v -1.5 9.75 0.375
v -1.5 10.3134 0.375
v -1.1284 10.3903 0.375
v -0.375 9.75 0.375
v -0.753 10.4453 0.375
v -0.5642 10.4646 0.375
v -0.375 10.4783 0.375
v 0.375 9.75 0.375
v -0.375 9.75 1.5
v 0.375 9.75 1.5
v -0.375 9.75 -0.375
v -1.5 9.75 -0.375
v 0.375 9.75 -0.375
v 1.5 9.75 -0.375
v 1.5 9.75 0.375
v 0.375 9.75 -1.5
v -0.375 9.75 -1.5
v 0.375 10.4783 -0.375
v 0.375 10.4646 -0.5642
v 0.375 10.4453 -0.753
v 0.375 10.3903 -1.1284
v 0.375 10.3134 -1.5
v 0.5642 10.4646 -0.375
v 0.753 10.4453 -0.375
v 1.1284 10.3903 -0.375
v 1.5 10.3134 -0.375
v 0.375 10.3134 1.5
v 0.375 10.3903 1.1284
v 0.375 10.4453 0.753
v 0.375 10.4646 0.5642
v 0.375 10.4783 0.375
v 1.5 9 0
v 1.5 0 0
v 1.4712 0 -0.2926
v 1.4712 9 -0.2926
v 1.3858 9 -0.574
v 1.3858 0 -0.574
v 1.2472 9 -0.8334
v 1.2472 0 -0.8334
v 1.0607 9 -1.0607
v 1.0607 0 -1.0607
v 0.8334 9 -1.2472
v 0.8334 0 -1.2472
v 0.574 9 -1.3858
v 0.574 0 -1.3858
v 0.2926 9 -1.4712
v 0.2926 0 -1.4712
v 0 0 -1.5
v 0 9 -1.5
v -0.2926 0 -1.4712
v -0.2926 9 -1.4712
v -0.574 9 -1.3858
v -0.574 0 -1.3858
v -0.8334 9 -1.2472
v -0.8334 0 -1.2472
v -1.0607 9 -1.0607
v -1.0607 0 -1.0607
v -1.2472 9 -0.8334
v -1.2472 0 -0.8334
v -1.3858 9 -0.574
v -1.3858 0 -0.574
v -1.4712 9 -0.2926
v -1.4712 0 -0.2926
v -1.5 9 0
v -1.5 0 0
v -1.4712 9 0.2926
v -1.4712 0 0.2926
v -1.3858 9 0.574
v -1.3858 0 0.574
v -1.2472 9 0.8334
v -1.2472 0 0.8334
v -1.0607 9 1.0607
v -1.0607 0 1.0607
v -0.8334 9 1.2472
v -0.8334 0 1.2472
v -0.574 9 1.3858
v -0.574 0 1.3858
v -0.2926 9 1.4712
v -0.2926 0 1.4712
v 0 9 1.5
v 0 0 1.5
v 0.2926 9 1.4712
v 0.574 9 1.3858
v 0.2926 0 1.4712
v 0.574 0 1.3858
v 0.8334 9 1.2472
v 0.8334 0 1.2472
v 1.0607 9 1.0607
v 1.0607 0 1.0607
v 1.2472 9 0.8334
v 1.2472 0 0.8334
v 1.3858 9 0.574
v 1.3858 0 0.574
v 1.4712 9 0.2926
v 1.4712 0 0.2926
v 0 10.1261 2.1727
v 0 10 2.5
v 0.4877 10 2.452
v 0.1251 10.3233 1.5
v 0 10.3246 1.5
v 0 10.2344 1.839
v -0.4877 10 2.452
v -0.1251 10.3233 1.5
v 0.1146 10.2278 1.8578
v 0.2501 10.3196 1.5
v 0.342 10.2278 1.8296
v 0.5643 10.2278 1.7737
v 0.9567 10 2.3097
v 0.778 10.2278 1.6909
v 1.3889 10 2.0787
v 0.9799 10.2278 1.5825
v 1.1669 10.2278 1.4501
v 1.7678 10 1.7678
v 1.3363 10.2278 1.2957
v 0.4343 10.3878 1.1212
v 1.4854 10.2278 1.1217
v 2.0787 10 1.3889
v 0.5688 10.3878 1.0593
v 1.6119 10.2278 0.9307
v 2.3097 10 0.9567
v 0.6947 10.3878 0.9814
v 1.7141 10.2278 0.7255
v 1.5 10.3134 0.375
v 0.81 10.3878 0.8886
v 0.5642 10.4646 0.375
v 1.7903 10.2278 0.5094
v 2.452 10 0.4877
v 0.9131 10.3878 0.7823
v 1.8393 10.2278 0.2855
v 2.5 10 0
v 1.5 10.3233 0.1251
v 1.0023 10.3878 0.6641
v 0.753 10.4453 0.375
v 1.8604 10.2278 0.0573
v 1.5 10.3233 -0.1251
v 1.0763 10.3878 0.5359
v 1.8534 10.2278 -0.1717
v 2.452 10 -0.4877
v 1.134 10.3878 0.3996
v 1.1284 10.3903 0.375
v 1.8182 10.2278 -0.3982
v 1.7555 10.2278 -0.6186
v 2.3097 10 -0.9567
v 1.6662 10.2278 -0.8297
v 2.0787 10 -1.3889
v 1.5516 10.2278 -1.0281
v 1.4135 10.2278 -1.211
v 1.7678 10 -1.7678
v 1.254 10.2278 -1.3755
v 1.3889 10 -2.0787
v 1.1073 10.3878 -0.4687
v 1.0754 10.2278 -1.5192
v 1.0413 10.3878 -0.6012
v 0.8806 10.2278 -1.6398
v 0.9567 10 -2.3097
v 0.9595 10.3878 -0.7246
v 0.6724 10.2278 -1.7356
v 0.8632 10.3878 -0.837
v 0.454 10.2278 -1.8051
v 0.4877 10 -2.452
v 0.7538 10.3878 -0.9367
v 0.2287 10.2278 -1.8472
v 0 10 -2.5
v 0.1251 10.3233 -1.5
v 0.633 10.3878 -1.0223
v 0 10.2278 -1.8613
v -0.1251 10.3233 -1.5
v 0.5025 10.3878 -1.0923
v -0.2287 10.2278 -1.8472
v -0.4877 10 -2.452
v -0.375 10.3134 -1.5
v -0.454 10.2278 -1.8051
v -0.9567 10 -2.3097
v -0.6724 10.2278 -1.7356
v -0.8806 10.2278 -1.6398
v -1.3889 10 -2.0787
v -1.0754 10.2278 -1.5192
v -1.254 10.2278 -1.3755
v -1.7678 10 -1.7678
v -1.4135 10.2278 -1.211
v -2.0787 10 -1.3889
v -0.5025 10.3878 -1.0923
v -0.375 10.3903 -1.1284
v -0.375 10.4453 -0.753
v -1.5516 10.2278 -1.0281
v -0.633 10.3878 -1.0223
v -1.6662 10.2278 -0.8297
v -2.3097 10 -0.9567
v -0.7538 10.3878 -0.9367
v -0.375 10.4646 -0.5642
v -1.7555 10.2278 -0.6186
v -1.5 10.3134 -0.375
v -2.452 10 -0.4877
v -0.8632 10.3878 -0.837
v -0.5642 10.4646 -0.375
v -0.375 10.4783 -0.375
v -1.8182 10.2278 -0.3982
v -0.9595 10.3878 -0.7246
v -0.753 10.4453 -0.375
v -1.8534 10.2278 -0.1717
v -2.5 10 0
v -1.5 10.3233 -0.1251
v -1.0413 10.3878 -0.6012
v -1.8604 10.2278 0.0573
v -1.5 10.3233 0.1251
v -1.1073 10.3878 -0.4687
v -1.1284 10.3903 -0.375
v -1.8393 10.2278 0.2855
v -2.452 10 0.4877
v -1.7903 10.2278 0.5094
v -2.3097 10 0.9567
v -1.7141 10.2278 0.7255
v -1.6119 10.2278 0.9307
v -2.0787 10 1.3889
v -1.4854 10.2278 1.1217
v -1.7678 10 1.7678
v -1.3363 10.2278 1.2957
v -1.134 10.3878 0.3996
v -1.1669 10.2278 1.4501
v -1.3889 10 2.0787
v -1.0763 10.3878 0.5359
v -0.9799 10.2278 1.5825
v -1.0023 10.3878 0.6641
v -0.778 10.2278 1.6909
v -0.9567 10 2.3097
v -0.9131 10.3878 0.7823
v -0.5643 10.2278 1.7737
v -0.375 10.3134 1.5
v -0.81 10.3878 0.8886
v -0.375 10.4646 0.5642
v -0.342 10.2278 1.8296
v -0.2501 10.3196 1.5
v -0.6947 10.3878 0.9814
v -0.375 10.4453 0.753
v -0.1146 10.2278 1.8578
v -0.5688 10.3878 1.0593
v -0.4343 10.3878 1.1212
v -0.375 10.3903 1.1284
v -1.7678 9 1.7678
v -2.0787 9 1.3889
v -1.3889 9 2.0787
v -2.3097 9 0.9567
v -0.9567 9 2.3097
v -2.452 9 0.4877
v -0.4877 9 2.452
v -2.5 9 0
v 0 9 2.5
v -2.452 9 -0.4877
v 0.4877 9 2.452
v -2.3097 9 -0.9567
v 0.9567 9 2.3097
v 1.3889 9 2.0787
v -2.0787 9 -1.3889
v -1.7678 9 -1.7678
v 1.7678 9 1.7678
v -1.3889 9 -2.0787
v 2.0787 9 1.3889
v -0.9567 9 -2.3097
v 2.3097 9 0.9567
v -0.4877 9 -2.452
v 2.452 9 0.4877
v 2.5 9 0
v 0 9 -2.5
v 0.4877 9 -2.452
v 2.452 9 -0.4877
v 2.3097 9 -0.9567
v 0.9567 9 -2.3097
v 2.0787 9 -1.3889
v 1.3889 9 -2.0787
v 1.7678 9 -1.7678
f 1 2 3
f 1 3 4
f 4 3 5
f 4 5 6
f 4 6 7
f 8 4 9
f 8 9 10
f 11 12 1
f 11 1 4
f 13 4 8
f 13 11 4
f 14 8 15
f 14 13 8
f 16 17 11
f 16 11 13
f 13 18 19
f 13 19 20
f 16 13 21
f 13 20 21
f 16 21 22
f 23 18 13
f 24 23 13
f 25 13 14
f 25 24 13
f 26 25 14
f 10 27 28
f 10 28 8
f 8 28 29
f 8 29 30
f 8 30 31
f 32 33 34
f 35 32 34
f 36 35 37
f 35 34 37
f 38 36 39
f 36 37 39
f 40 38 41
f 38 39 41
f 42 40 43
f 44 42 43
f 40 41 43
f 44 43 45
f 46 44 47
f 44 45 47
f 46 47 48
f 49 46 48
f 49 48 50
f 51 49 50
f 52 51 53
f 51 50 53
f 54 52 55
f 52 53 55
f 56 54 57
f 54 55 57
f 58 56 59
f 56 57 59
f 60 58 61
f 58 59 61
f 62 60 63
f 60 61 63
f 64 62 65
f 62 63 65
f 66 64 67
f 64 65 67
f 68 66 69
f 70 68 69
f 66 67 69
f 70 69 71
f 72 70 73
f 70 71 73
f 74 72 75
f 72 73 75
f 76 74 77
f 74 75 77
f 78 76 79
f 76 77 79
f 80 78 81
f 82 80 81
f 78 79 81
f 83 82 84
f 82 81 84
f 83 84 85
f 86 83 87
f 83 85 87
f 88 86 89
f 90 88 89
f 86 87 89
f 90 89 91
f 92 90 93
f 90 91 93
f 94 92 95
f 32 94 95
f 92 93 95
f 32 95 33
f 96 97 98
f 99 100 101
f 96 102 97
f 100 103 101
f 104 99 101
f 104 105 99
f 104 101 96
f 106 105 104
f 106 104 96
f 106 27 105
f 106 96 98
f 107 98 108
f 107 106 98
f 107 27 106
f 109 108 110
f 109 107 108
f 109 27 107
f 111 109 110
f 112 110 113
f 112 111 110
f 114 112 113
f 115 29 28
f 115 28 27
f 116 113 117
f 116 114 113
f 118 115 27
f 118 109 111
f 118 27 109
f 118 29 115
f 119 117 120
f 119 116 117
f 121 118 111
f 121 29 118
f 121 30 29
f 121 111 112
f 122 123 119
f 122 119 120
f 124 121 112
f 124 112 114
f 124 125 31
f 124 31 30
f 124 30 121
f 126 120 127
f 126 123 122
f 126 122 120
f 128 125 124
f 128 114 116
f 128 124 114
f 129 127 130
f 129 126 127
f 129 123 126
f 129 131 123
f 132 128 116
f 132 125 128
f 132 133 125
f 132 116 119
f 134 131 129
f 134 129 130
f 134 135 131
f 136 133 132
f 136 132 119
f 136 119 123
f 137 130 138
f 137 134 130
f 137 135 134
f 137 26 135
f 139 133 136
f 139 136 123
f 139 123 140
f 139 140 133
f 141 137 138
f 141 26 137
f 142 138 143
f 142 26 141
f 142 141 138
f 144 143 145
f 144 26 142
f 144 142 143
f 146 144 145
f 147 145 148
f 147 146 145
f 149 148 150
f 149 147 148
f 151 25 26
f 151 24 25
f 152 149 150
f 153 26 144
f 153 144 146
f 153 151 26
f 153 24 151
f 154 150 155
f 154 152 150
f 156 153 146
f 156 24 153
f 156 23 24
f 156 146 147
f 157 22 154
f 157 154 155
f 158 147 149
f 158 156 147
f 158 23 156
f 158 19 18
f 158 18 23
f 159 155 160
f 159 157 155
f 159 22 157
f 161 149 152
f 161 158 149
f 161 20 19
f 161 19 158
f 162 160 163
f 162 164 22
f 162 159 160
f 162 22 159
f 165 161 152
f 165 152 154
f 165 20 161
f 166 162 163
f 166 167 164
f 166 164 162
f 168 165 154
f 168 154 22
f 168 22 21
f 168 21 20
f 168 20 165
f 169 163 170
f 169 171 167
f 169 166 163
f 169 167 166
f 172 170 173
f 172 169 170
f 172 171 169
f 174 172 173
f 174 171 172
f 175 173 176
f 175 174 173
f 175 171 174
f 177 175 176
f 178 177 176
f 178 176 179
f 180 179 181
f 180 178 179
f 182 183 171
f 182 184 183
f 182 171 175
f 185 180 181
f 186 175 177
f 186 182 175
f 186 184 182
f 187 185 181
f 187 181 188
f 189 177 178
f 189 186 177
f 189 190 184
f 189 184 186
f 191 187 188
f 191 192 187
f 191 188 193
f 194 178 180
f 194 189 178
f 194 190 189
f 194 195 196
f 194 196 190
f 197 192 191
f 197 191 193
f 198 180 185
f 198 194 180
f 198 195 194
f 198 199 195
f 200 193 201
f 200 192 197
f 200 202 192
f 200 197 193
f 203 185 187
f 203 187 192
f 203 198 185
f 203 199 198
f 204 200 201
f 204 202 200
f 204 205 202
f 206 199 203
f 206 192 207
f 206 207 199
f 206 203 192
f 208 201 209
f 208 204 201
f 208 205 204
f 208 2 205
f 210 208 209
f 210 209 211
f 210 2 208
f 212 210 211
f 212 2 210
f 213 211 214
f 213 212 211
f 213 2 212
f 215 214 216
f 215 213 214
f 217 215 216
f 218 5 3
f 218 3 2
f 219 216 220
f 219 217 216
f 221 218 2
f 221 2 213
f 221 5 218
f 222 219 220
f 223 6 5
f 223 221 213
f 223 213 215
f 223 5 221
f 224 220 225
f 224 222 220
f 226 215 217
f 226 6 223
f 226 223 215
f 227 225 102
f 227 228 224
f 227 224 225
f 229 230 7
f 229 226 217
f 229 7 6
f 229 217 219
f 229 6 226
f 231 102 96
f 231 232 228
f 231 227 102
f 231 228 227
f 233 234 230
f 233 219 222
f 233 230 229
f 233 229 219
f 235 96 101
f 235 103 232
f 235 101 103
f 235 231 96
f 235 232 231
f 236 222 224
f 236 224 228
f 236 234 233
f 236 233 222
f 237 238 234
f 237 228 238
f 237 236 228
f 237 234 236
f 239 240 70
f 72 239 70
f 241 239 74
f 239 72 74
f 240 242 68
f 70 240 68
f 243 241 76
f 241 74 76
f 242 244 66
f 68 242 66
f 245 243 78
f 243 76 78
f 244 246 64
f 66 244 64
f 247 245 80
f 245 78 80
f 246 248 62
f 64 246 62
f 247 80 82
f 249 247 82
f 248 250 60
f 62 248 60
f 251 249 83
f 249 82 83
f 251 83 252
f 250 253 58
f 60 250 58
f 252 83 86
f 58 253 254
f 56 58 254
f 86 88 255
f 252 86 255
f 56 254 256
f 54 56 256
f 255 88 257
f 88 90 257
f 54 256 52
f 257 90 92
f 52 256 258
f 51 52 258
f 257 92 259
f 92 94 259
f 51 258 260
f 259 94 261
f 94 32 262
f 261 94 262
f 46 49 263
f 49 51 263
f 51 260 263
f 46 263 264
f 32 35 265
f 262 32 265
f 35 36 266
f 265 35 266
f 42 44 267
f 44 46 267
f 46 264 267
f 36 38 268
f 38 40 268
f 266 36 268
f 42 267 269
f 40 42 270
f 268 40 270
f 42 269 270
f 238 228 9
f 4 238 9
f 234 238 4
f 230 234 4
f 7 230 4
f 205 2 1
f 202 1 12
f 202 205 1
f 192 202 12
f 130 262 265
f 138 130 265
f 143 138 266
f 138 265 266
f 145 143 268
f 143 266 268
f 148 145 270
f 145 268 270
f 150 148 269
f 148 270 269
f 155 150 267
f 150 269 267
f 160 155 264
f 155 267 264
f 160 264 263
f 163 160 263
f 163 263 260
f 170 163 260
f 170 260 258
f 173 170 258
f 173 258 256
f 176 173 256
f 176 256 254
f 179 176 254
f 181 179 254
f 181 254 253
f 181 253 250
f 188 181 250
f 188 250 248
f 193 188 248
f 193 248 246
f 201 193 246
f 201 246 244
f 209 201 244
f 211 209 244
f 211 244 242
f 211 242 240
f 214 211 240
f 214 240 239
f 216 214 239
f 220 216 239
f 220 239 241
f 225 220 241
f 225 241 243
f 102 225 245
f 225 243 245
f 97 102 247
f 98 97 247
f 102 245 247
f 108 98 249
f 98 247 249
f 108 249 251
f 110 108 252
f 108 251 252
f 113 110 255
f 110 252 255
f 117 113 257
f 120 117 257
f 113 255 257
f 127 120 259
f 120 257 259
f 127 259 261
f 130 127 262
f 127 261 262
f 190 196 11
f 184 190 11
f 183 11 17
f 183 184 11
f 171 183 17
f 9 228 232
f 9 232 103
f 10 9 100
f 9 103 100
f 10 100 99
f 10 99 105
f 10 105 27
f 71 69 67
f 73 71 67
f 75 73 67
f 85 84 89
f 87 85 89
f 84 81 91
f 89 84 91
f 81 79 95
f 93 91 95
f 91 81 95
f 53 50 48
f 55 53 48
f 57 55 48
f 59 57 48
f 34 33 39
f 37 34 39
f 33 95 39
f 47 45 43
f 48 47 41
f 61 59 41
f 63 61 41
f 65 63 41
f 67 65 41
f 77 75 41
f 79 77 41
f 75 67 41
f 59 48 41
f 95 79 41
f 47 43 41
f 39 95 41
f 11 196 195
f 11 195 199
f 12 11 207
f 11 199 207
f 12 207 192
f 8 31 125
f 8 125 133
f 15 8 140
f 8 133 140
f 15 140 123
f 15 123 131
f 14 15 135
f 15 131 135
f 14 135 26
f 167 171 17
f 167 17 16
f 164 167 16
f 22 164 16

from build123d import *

# Parameters (mm, degrees)
SKETCH1_R           = 1.5
BOSS_EXTRUDE1_DEPTH = 9
SKETCH2_R           = 2.5
BOSS_EXTRUDE2_DEPTH = 1
DOME1_FACE_RADIUS   = 2.5
DOME1_HEIGHT        = 0.5
SKETCH3_W           = 1.125
SKETCH3_H           = 0.75
SKETCH3_W_2         = 0.75
SKETCH3_H_2         = 1.125
CUT_EXTRUDE1_DEPTH  = 0.75


with BuildPart() as part:
    # Sketch1 → Boss-Extrude1 (new body)
    with BuildSketch(Plane(origin=(0, 0, 0), x_dir=(1, 0, 0), z_dir=(0, 1, 0))):
        Circle(SKETCH1_R)
    extrude(amount=BOSS_EXTRUDE1_DEPTH)

    # Sketch2 → Boss-Extrude2 (add)
    with BuildSketch(Plane(origin=(0, 9, 0), x_dir=(1, 0, 0), z_dir=(0, 1, 0))):
        Circle(SKETCH2_R)
    extrude(amount=BOSS_EXTRUDE2_DEPTH)

    # Dome1: a dome of height H over a round flat face of radius A is a cap of a sphere of radius (A * A + H * H) / (2 * H)
    dome1_r = (DOME1_FACE_RADIUS * DOME1_FACE_RADIUS + DOME1_HEIGHT * DOME1_HEIGHT) / (2 * DOME1_HEIGHT)
    dome1_base = Plane((0, 10, 0), z_dir=(0, 1, 0))
    with Locations(dome1_base.offset(DOME1_HEIGHT - dome1_r)):
        dome1_ball = Sphere(dome1_r, mode=Mode.PRIVATE)
    add(split(dome1_ball, bisect_by=dome1_base, keep=Keep.TOP, mode=Mode.PRIVATE))

    # Sketch3 → Cut-Extrude1 (cut)
    with BuildSketch(Plane(origin=(0, 10.5, 0), x_dir=(1, 0, 0), z_dir=(0, 1, 0))):
        with Locations((-0.9375, 0)):
            Rectangle(SKETCH3_W, SKETCH3_H)
        Rectangle(SKETCH3_W_2, SKETCH3_H)
        with Locations((0, 0.9375)):
            Rectangle(SKETCH3_W_2, SKETCH3_H_2)
        with Locations((0.9375, 0)):
            Rectangle(SKETCH3_W, SKETCH3_H)
        with Locations((0, -0.9375)):
            Rectangle(SKETCH3_W_2, SKETCH3_H_2)
    extrude(amount=-CUT_EXTRUDE1_DEPTH, mode=Mode.SUBTRACT)


solid = part.part
